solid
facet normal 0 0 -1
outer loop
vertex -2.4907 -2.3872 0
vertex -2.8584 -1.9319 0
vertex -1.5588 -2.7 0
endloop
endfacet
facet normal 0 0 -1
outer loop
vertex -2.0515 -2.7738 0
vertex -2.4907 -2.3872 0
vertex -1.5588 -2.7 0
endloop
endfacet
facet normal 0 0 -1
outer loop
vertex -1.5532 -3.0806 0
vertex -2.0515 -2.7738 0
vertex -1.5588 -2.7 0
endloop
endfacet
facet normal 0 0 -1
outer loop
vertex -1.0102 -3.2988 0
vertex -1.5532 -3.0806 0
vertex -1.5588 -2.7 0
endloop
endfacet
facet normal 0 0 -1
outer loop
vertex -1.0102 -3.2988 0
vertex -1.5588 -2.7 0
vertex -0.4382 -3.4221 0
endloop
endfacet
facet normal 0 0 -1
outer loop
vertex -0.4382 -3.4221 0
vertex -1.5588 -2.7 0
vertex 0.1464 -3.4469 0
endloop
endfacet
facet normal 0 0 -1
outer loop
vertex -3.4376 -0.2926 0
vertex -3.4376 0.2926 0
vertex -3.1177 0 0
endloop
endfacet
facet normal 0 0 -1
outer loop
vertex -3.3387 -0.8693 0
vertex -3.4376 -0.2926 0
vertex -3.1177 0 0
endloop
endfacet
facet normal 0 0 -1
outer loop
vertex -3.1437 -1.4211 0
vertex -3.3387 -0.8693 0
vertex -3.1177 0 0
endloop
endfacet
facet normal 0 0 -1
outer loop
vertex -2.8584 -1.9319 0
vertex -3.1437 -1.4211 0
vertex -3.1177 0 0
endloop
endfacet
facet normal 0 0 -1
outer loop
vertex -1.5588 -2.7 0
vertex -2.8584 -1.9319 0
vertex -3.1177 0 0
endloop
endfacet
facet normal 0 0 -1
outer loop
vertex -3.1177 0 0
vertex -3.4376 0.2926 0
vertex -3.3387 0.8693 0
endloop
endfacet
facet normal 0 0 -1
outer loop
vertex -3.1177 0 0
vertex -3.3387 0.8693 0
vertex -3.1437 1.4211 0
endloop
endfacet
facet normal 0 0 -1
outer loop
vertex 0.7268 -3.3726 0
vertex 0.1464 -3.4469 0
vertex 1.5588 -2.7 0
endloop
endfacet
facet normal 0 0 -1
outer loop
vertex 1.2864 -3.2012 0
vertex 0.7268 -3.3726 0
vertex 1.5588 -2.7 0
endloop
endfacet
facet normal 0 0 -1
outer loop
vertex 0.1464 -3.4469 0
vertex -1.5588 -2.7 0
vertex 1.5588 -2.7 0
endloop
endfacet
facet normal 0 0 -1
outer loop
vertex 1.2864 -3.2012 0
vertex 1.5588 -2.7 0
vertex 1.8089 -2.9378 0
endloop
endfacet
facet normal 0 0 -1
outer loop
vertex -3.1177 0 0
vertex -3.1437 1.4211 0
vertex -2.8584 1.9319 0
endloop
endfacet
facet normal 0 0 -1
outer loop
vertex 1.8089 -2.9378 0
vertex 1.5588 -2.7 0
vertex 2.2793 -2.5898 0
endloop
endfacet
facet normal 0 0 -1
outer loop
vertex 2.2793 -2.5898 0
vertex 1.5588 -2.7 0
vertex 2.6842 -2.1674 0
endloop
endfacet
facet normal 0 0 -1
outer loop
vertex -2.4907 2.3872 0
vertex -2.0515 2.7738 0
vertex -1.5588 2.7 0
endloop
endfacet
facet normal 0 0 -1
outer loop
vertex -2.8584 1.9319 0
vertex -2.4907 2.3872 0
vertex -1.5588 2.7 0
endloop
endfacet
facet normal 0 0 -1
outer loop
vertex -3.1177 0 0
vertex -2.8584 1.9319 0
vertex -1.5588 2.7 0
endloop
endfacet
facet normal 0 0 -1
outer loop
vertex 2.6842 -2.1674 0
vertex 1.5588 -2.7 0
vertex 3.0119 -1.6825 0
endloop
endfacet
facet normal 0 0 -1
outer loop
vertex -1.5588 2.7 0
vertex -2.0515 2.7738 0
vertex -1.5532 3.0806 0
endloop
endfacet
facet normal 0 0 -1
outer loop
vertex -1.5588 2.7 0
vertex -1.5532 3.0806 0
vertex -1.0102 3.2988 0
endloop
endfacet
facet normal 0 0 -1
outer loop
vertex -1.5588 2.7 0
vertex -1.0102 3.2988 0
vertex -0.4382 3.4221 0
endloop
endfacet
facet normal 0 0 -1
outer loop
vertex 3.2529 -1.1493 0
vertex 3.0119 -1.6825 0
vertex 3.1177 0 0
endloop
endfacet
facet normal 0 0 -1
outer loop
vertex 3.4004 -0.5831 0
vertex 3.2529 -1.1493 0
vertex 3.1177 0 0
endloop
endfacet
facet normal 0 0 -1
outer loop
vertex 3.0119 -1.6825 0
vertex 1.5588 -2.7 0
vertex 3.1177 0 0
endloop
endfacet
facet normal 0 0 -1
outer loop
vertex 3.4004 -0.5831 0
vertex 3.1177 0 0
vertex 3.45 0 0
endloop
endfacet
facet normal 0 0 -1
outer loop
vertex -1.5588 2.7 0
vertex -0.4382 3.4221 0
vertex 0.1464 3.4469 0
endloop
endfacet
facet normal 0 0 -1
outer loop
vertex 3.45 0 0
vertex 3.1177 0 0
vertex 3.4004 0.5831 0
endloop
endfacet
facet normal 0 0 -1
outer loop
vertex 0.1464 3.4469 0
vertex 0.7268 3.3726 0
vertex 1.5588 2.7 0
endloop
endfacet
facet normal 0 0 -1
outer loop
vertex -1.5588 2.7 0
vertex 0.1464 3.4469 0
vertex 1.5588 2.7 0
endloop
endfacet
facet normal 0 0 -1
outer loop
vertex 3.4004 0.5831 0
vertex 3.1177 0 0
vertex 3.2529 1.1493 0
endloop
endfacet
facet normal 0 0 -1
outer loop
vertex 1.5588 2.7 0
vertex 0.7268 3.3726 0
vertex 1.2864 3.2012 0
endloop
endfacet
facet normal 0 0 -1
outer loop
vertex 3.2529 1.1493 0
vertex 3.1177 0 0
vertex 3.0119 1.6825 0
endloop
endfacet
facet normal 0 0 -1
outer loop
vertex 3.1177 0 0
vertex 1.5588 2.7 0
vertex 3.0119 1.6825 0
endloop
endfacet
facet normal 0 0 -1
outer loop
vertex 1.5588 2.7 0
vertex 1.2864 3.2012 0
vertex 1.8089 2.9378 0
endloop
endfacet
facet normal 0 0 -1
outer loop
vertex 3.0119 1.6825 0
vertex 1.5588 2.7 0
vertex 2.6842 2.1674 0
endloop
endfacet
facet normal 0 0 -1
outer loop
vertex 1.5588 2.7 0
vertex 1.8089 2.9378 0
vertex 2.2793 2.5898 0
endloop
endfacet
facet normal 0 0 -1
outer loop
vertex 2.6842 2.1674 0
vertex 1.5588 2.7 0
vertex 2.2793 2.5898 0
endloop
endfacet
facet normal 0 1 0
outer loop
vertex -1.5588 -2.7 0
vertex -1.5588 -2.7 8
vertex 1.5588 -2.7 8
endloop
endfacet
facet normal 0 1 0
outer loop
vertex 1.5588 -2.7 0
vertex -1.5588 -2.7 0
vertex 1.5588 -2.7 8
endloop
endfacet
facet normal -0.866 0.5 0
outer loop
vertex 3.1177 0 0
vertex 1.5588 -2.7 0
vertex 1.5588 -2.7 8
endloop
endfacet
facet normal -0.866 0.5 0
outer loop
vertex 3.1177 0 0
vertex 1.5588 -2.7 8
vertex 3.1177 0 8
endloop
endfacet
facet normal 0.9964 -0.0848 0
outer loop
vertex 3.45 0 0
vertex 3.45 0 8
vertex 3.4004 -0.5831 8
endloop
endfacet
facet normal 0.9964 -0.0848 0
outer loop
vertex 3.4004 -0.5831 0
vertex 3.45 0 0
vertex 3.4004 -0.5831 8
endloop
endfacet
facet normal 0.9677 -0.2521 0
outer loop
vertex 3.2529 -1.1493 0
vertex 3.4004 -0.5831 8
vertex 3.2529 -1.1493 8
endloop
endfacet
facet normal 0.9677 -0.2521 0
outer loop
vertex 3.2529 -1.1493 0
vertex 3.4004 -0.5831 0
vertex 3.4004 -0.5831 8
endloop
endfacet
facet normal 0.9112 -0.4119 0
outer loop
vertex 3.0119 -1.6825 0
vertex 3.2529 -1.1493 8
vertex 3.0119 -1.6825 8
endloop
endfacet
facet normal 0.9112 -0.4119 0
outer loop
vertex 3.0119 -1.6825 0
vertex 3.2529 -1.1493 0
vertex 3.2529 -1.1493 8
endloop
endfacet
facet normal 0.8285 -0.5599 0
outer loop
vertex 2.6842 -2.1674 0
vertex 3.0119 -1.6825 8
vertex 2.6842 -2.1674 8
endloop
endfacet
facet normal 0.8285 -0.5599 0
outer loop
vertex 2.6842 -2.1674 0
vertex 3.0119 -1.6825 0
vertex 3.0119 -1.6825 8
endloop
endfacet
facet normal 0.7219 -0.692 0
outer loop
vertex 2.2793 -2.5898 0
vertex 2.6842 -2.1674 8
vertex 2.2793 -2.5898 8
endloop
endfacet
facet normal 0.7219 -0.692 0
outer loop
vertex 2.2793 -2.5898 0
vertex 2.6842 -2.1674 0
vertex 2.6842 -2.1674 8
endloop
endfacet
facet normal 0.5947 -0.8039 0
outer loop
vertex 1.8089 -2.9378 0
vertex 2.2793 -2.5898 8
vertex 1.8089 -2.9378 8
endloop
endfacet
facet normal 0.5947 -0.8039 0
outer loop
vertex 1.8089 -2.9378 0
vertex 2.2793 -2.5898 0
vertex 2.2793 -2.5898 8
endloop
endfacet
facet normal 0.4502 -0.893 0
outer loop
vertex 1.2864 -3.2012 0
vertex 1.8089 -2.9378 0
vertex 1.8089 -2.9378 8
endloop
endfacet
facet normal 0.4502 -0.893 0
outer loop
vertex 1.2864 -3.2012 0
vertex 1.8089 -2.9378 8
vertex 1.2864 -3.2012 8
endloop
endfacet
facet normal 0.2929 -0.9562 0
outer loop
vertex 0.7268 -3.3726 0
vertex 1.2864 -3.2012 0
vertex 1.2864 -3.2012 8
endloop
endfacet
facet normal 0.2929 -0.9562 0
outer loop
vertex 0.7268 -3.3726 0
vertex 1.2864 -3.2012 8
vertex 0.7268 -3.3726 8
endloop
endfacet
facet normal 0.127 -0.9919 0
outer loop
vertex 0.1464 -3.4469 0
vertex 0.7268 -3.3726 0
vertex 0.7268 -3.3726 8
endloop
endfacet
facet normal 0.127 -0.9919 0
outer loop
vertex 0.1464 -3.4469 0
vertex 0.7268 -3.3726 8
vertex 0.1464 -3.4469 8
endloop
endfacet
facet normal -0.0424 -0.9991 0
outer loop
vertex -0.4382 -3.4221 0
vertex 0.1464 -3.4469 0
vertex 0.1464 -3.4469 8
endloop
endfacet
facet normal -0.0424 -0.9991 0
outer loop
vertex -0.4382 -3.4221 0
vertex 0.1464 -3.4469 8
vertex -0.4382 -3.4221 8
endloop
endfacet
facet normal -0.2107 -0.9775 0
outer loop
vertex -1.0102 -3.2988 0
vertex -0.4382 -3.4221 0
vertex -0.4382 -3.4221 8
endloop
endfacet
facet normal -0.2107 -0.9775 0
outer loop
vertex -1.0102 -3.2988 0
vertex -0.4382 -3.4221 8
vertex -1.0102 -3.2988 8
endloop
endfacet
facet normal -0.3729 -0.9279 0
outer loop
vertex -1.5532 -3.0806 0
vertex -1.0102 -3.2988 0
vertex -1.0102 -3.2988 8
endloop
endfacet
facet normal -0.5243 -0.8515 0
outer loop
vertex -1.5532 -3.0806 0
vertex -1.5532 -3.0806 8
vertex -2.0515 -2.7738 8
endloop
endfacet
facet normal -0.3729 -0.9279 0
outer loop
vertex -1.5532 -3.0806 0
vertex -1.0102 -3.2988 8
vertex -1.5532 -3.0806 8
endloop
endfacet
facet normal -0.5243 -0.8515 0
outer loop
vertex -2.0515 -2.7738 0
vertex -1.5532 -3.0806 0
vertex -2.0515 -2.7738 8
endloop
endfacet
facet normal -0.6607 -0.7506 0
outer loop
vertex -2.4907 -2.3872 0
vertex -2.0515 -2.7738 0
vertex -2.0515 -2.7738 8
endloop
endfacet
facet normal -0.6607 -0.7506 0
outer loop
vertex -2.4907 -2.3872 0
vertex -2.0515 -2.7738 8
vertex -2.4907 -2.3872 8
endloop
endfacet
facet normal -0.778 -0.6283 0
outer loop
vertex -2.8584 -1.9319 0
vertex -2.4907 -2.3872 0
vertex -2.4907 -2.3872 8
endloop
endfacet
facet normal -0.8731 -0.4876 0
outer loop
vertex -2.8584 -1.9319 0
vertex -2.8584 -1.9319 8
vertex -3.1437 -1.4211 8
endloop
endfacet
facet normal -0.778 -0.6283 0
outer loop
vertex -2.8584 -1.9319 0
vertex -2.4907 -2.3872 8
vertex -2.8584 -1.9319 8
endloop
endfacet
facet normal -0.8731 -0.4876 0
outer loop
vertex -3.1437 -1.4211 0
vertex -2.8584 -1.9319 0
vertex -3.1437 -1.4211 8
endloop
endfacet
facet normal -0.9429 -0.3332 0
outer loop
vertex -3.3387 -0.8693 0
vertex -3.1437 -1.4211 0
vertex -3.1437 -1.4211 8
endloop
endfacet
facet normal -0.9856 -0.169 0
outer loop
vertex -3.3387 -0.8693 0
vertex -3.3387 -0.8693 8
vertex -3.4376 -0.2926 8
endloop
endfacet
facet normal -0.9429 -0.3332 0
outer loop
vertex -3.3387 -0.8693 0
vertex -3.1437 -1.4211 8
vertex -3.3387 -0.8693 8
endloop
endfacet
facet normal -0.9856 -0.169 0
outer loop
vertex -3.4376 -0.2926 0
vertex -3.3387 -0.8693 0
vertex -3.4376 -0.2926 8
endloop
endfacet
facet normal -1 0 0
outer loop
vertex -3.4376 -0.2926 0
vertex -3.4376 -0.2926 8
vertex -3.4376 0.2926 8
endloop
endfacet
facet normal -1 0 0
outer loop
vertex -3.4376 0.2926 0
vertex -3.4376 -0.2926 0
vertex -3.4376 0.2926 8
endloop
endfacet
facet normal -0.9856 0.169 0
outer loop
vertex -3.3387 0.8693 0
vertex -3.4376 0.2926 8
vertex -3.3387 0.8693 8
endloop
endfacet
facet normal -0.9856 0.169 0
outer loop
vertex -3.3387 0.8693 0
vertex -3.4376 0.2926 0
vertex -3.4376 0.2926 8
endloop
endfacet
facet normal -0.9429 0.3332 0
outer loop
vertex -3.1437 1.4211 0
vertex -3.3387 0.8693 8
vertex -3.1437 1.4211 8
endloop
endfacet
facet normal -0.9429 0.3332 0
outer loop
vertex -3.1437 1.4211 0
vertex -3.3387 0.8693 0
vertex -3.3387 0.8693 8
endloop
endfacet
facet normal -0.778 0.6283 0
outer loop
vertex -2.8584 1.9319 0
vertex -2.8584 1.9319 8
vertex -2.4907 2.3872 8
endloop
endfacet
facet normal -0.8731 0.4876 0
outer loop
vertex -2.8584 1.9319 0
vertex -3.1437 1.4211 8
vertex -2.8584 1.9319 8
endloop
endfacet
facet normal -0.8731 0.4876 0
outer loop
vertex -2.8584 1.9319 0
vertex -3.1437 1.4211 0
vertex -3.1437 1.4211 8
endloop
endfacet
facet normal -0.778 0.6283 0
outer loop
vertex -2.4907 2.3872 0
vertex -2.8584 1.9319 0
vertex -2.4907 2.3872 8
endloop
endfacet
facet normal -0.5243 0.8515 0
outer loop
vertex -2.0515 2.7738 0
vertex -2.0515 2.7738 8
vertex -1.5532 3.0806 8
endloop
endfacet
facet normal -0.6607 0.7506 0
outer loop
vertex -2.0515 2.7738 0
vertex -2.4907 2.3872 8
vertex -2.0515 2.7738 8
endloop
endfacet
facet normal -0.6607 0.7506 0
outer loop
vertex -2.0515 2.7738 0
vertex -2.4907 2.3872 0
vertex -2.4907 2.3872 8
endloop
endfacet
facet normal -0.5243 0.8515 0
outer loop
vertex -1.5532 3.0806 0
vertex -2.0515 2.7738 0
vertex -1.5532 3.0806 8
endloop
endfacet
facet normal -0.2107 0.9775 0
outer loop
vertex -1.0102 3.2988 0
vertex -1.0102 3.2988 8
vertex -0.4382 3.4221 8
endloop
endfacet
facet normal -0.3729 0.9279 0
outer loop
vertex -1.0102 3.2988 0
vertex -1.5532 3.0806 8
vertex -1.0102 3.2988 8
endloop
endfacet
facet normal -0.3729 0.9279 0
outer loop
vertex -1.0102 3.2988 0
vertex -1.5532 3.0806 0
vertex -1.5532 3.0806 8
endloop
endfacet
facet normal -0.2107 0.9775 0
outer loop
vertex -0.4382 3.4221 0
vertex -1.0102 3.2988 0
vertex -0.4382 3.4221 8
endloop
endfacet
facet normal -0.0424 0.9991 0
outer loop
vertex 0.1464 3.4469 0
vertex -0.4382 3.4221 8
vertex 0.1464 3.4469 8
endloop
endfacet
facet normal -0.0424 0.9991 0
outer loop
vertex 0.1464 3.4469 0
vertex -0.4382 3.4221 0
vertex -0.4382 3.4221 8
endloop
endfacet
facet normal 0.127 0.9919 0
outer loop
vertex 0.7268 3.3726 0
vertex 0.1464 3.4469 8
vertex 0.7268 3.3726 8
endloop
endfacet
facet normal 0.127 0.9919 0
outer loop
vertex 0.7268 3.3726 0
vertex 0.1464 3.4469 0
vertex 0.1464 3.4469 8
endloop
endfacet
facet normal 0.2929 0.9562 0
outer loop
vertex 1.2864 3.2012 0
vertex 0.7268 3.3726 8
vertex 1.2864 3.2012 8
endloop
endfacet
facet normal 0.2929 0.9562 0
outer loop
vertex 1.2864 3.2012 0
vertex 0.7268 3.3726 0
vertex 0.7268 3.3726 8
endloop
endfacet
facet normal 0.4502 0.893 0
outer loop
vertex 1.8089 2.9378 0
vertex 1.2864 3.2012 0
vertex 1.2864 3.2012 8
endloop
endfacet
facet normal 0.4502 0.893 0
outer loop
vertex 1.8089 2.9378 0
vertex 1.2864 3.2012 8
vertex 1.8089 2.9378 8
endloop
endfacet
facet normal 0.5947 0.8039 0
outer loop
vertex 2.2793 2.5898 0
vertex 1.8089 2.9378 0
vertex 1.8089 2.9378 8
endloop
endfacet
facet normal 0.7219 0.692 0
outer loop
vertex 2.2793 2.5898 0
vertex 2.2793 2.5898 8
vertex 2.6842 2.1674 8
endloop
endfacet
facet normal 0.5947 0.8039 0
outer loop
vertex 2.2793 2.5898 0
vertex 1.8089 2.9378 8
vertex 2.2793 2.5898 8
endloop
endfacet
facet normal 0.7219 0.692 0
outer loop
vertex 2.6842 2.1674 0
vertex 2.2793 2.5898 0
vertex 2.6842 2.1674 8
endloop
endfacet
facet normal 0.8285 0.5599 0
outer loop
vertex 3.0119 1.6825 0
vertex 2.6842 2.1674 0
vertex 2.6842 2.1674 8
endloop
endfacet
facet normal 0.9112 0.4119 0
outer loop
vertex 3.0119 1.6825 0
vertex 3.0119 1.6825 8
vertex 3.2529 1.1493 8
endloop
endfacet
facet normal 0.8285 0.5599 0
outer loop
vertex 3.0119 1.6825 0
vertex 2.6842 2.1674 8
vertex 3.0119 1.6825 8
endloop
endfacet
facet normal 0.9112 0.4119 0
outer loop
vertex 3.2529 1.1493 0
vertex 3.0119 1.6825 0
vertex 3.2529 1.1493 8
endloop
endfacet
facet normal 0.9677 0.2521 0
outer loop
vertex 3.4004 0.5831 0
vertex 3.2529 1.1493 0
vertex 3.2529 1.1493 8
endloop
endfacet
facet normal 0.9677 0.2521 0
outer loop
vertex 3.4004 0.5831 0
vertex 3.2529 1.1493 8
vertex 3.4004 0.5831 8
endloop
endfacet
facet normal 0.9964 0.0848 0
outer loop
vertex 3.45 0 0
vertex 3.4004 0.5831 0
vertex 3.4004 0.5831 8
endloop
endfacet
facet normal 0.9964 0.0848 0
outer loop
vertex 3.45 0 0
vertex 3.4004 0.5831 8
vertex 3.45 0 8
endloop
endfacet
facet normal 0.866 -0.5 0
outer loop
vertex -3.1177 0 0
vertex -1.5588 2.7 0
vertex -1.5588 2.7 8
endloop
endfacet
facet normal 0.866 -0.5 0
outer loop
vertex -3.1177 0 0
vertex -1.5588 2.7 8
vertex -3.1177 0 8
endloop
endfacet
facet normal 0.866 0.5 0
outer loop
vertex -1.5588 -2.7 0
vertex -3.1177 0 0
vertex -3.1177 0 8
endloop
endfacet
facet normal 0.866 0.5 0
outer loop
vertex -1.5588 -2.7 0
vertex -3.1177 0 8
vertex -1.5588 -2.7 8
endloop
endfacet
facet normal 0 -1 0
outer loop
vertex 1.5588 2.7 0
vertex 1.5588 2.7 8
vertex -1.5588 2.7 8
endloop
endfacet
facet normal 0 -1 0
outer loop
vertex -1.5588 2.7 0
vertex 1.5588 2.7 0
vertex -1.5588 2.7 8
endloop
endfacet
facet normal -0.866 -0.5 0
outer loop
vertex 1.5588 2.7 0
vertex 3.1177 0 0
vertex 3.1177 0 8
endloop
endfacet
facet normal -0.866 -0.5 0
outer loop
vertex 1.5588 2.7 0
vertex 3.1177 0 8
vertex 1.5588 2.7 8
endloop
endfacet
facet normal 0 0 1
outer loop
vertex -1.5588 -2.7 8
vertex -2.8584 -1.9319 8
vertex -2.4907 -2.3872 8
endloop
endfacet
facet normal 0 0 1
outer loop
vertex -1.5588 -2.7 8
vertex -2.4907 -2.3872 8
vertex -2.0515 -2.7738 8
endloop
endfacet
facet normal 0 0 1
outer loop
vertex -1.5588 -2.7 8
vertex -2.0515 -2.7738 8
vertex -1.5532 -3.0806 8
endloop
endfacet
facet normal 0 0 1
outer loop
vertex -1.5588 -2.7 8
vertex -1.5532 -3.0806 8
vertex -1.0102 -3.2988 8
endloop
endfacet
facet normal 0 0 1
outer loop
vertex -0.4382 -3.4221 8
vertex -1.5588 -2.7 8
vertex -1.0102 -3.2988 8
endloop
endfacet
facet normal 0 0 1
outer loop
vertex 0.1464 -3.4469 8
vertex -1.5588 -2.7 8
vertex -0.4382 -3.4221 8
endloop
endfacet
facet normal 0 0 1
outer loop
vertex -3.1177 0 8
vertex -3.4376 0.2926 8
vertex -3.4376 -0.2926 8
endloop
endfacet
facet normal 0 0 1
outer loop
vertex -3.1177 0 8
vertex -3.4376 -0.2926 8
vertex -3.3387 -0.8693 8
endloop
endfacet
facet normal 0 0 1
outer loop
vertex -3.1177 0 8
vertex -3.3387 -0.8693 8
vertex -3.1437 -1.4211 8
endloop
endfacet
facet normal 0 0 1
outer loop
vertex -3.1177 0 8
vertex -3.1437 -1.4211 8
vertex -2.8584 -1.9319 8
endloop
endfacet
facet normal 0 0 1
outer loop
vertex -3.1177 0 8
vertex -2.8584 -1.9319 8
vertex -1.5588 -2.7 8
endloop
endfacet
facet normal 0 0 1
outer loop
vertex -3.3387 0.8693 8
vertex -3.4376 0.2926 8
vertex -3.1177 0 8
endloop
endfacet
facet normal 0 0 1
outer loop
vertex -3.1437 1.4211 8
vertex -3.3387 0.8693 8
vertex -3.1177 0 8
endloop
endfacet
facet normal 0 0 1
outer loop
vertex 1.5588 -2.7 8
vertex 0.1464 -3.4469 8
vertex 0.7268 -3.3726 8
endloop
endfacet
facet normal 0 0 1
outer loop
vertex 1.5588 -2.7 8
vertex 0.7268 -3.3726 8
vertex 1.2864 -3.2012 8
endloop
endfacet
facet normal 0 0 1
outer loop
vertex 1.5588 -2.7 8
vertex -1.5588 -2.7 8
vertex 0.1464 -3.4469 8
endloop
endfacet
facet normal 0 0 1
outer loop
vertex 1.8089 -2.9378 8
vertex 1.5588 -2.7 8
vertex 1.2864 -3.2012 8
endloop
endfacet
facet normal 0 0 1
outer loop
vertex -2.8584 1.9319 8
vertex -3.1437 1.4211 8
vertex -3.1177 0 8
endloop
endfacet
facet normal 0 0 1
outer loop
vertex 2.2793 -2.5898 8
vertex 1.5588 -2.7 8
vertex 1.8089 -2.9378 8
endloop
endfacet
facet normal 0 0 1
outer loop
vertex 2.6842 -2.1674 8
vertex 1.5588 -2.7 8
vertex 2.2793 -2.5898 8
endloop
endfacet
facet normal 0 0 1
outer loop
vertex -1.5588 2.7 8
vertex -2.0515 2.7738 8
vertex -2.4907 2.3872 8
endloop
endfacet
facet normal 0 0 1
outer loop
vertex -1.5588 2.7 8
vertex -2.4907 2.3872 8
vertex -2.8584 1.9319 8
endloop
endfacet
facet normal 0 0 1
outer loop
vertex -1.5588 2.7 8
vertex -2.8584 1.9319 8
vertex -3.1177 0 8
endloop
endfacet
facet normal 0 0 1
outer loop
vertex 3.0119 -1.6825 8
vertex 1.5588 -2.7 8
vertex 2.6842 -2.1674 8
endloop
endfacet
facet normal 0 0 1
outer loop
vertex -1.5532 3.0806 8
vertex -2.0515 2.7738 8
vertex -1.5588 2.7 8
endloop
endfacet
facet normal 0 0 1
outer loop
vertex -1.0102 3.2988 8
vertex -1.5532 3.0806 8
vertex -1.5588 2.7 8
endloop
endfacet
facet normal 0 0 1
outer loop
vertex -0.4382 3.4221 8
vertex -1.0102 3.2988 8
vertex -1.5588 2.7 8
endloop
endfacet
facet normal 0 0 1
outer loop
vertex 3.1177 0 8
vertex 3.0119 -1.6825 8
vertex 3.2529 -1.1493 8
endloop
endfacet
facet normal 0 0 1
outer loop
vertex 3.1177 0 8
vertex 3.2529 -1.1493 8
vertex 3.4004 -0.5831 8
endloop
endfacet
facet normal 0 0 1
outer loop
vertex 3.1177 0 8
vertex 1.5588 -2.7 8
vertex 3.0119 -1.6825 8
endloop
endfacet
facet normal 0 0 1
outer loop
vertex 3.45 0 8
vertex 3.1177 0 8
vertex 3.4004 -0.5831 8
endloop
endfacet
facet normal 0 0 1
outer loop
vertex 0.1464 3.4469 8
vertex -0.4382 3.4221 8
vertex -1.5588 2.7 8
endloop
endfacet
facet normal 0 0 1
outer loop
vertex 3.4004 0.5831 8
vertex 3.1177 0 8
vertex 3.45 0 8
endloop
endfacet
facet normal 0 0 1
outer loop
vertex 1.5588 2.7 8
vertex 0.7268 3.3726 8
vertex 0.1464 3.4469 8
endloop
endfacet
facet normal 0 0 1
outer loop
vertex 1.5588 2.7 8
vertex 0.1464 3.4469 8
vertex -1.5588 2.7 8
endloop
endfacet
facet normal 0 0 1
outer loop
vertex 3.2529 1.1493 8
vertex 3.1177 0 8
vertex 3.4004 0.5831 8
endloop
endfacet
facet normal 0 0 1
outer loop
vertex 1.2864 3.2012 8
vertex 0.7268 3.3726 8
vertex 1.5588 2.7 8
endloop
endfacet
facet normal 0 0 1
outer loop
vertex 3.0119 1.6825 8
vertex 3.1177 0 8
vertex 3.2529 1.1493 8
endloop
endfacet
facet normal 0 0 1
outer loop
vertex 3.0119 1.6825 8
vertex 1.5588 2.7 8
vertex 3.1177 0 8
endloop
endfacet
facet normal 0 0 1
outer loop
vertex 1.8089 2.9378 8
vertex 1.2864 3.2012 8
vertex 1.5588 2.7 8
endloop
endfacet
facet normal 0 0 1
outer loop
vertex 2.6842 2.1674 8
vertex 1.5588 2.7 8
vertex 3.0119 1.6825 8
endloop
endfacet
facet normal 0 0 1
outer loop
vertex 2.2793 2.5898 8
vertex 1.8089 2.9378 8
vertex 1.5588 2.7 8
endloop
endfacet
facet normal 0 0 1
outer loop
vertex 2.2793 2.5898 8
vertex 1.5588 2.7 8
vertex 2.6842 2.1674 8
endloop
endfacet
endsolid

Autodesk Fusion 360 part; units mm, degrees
sketch "スケッチ1" plane through (0, 0, 0) normal (0, 0, 1) x (1, 0, 0)
  circle A0 centre (0, 0) radius 3.45
  line L0 (3.1177, 0) -> (1.5588, 2.7)
  line L1 (1.5588, 2.7) -> (-1.5588, 2.7)
  line L2 (-1.5588, 2.7) -> (-3.1177, 0)
  line L3 (-3.1177, 0) -> (-1.5588, -2.7)
  line L4 (-1.5588, -2.7) -> (1.5588, -2.7)
  line L5 (1.5588, -2.7) -> (3.1177, 0)
  dimension "d1" = 6.9
  dimension "d2" = 5.4
extrude "押し出し1" add sketch "スケッチ1" along normal blind 8
